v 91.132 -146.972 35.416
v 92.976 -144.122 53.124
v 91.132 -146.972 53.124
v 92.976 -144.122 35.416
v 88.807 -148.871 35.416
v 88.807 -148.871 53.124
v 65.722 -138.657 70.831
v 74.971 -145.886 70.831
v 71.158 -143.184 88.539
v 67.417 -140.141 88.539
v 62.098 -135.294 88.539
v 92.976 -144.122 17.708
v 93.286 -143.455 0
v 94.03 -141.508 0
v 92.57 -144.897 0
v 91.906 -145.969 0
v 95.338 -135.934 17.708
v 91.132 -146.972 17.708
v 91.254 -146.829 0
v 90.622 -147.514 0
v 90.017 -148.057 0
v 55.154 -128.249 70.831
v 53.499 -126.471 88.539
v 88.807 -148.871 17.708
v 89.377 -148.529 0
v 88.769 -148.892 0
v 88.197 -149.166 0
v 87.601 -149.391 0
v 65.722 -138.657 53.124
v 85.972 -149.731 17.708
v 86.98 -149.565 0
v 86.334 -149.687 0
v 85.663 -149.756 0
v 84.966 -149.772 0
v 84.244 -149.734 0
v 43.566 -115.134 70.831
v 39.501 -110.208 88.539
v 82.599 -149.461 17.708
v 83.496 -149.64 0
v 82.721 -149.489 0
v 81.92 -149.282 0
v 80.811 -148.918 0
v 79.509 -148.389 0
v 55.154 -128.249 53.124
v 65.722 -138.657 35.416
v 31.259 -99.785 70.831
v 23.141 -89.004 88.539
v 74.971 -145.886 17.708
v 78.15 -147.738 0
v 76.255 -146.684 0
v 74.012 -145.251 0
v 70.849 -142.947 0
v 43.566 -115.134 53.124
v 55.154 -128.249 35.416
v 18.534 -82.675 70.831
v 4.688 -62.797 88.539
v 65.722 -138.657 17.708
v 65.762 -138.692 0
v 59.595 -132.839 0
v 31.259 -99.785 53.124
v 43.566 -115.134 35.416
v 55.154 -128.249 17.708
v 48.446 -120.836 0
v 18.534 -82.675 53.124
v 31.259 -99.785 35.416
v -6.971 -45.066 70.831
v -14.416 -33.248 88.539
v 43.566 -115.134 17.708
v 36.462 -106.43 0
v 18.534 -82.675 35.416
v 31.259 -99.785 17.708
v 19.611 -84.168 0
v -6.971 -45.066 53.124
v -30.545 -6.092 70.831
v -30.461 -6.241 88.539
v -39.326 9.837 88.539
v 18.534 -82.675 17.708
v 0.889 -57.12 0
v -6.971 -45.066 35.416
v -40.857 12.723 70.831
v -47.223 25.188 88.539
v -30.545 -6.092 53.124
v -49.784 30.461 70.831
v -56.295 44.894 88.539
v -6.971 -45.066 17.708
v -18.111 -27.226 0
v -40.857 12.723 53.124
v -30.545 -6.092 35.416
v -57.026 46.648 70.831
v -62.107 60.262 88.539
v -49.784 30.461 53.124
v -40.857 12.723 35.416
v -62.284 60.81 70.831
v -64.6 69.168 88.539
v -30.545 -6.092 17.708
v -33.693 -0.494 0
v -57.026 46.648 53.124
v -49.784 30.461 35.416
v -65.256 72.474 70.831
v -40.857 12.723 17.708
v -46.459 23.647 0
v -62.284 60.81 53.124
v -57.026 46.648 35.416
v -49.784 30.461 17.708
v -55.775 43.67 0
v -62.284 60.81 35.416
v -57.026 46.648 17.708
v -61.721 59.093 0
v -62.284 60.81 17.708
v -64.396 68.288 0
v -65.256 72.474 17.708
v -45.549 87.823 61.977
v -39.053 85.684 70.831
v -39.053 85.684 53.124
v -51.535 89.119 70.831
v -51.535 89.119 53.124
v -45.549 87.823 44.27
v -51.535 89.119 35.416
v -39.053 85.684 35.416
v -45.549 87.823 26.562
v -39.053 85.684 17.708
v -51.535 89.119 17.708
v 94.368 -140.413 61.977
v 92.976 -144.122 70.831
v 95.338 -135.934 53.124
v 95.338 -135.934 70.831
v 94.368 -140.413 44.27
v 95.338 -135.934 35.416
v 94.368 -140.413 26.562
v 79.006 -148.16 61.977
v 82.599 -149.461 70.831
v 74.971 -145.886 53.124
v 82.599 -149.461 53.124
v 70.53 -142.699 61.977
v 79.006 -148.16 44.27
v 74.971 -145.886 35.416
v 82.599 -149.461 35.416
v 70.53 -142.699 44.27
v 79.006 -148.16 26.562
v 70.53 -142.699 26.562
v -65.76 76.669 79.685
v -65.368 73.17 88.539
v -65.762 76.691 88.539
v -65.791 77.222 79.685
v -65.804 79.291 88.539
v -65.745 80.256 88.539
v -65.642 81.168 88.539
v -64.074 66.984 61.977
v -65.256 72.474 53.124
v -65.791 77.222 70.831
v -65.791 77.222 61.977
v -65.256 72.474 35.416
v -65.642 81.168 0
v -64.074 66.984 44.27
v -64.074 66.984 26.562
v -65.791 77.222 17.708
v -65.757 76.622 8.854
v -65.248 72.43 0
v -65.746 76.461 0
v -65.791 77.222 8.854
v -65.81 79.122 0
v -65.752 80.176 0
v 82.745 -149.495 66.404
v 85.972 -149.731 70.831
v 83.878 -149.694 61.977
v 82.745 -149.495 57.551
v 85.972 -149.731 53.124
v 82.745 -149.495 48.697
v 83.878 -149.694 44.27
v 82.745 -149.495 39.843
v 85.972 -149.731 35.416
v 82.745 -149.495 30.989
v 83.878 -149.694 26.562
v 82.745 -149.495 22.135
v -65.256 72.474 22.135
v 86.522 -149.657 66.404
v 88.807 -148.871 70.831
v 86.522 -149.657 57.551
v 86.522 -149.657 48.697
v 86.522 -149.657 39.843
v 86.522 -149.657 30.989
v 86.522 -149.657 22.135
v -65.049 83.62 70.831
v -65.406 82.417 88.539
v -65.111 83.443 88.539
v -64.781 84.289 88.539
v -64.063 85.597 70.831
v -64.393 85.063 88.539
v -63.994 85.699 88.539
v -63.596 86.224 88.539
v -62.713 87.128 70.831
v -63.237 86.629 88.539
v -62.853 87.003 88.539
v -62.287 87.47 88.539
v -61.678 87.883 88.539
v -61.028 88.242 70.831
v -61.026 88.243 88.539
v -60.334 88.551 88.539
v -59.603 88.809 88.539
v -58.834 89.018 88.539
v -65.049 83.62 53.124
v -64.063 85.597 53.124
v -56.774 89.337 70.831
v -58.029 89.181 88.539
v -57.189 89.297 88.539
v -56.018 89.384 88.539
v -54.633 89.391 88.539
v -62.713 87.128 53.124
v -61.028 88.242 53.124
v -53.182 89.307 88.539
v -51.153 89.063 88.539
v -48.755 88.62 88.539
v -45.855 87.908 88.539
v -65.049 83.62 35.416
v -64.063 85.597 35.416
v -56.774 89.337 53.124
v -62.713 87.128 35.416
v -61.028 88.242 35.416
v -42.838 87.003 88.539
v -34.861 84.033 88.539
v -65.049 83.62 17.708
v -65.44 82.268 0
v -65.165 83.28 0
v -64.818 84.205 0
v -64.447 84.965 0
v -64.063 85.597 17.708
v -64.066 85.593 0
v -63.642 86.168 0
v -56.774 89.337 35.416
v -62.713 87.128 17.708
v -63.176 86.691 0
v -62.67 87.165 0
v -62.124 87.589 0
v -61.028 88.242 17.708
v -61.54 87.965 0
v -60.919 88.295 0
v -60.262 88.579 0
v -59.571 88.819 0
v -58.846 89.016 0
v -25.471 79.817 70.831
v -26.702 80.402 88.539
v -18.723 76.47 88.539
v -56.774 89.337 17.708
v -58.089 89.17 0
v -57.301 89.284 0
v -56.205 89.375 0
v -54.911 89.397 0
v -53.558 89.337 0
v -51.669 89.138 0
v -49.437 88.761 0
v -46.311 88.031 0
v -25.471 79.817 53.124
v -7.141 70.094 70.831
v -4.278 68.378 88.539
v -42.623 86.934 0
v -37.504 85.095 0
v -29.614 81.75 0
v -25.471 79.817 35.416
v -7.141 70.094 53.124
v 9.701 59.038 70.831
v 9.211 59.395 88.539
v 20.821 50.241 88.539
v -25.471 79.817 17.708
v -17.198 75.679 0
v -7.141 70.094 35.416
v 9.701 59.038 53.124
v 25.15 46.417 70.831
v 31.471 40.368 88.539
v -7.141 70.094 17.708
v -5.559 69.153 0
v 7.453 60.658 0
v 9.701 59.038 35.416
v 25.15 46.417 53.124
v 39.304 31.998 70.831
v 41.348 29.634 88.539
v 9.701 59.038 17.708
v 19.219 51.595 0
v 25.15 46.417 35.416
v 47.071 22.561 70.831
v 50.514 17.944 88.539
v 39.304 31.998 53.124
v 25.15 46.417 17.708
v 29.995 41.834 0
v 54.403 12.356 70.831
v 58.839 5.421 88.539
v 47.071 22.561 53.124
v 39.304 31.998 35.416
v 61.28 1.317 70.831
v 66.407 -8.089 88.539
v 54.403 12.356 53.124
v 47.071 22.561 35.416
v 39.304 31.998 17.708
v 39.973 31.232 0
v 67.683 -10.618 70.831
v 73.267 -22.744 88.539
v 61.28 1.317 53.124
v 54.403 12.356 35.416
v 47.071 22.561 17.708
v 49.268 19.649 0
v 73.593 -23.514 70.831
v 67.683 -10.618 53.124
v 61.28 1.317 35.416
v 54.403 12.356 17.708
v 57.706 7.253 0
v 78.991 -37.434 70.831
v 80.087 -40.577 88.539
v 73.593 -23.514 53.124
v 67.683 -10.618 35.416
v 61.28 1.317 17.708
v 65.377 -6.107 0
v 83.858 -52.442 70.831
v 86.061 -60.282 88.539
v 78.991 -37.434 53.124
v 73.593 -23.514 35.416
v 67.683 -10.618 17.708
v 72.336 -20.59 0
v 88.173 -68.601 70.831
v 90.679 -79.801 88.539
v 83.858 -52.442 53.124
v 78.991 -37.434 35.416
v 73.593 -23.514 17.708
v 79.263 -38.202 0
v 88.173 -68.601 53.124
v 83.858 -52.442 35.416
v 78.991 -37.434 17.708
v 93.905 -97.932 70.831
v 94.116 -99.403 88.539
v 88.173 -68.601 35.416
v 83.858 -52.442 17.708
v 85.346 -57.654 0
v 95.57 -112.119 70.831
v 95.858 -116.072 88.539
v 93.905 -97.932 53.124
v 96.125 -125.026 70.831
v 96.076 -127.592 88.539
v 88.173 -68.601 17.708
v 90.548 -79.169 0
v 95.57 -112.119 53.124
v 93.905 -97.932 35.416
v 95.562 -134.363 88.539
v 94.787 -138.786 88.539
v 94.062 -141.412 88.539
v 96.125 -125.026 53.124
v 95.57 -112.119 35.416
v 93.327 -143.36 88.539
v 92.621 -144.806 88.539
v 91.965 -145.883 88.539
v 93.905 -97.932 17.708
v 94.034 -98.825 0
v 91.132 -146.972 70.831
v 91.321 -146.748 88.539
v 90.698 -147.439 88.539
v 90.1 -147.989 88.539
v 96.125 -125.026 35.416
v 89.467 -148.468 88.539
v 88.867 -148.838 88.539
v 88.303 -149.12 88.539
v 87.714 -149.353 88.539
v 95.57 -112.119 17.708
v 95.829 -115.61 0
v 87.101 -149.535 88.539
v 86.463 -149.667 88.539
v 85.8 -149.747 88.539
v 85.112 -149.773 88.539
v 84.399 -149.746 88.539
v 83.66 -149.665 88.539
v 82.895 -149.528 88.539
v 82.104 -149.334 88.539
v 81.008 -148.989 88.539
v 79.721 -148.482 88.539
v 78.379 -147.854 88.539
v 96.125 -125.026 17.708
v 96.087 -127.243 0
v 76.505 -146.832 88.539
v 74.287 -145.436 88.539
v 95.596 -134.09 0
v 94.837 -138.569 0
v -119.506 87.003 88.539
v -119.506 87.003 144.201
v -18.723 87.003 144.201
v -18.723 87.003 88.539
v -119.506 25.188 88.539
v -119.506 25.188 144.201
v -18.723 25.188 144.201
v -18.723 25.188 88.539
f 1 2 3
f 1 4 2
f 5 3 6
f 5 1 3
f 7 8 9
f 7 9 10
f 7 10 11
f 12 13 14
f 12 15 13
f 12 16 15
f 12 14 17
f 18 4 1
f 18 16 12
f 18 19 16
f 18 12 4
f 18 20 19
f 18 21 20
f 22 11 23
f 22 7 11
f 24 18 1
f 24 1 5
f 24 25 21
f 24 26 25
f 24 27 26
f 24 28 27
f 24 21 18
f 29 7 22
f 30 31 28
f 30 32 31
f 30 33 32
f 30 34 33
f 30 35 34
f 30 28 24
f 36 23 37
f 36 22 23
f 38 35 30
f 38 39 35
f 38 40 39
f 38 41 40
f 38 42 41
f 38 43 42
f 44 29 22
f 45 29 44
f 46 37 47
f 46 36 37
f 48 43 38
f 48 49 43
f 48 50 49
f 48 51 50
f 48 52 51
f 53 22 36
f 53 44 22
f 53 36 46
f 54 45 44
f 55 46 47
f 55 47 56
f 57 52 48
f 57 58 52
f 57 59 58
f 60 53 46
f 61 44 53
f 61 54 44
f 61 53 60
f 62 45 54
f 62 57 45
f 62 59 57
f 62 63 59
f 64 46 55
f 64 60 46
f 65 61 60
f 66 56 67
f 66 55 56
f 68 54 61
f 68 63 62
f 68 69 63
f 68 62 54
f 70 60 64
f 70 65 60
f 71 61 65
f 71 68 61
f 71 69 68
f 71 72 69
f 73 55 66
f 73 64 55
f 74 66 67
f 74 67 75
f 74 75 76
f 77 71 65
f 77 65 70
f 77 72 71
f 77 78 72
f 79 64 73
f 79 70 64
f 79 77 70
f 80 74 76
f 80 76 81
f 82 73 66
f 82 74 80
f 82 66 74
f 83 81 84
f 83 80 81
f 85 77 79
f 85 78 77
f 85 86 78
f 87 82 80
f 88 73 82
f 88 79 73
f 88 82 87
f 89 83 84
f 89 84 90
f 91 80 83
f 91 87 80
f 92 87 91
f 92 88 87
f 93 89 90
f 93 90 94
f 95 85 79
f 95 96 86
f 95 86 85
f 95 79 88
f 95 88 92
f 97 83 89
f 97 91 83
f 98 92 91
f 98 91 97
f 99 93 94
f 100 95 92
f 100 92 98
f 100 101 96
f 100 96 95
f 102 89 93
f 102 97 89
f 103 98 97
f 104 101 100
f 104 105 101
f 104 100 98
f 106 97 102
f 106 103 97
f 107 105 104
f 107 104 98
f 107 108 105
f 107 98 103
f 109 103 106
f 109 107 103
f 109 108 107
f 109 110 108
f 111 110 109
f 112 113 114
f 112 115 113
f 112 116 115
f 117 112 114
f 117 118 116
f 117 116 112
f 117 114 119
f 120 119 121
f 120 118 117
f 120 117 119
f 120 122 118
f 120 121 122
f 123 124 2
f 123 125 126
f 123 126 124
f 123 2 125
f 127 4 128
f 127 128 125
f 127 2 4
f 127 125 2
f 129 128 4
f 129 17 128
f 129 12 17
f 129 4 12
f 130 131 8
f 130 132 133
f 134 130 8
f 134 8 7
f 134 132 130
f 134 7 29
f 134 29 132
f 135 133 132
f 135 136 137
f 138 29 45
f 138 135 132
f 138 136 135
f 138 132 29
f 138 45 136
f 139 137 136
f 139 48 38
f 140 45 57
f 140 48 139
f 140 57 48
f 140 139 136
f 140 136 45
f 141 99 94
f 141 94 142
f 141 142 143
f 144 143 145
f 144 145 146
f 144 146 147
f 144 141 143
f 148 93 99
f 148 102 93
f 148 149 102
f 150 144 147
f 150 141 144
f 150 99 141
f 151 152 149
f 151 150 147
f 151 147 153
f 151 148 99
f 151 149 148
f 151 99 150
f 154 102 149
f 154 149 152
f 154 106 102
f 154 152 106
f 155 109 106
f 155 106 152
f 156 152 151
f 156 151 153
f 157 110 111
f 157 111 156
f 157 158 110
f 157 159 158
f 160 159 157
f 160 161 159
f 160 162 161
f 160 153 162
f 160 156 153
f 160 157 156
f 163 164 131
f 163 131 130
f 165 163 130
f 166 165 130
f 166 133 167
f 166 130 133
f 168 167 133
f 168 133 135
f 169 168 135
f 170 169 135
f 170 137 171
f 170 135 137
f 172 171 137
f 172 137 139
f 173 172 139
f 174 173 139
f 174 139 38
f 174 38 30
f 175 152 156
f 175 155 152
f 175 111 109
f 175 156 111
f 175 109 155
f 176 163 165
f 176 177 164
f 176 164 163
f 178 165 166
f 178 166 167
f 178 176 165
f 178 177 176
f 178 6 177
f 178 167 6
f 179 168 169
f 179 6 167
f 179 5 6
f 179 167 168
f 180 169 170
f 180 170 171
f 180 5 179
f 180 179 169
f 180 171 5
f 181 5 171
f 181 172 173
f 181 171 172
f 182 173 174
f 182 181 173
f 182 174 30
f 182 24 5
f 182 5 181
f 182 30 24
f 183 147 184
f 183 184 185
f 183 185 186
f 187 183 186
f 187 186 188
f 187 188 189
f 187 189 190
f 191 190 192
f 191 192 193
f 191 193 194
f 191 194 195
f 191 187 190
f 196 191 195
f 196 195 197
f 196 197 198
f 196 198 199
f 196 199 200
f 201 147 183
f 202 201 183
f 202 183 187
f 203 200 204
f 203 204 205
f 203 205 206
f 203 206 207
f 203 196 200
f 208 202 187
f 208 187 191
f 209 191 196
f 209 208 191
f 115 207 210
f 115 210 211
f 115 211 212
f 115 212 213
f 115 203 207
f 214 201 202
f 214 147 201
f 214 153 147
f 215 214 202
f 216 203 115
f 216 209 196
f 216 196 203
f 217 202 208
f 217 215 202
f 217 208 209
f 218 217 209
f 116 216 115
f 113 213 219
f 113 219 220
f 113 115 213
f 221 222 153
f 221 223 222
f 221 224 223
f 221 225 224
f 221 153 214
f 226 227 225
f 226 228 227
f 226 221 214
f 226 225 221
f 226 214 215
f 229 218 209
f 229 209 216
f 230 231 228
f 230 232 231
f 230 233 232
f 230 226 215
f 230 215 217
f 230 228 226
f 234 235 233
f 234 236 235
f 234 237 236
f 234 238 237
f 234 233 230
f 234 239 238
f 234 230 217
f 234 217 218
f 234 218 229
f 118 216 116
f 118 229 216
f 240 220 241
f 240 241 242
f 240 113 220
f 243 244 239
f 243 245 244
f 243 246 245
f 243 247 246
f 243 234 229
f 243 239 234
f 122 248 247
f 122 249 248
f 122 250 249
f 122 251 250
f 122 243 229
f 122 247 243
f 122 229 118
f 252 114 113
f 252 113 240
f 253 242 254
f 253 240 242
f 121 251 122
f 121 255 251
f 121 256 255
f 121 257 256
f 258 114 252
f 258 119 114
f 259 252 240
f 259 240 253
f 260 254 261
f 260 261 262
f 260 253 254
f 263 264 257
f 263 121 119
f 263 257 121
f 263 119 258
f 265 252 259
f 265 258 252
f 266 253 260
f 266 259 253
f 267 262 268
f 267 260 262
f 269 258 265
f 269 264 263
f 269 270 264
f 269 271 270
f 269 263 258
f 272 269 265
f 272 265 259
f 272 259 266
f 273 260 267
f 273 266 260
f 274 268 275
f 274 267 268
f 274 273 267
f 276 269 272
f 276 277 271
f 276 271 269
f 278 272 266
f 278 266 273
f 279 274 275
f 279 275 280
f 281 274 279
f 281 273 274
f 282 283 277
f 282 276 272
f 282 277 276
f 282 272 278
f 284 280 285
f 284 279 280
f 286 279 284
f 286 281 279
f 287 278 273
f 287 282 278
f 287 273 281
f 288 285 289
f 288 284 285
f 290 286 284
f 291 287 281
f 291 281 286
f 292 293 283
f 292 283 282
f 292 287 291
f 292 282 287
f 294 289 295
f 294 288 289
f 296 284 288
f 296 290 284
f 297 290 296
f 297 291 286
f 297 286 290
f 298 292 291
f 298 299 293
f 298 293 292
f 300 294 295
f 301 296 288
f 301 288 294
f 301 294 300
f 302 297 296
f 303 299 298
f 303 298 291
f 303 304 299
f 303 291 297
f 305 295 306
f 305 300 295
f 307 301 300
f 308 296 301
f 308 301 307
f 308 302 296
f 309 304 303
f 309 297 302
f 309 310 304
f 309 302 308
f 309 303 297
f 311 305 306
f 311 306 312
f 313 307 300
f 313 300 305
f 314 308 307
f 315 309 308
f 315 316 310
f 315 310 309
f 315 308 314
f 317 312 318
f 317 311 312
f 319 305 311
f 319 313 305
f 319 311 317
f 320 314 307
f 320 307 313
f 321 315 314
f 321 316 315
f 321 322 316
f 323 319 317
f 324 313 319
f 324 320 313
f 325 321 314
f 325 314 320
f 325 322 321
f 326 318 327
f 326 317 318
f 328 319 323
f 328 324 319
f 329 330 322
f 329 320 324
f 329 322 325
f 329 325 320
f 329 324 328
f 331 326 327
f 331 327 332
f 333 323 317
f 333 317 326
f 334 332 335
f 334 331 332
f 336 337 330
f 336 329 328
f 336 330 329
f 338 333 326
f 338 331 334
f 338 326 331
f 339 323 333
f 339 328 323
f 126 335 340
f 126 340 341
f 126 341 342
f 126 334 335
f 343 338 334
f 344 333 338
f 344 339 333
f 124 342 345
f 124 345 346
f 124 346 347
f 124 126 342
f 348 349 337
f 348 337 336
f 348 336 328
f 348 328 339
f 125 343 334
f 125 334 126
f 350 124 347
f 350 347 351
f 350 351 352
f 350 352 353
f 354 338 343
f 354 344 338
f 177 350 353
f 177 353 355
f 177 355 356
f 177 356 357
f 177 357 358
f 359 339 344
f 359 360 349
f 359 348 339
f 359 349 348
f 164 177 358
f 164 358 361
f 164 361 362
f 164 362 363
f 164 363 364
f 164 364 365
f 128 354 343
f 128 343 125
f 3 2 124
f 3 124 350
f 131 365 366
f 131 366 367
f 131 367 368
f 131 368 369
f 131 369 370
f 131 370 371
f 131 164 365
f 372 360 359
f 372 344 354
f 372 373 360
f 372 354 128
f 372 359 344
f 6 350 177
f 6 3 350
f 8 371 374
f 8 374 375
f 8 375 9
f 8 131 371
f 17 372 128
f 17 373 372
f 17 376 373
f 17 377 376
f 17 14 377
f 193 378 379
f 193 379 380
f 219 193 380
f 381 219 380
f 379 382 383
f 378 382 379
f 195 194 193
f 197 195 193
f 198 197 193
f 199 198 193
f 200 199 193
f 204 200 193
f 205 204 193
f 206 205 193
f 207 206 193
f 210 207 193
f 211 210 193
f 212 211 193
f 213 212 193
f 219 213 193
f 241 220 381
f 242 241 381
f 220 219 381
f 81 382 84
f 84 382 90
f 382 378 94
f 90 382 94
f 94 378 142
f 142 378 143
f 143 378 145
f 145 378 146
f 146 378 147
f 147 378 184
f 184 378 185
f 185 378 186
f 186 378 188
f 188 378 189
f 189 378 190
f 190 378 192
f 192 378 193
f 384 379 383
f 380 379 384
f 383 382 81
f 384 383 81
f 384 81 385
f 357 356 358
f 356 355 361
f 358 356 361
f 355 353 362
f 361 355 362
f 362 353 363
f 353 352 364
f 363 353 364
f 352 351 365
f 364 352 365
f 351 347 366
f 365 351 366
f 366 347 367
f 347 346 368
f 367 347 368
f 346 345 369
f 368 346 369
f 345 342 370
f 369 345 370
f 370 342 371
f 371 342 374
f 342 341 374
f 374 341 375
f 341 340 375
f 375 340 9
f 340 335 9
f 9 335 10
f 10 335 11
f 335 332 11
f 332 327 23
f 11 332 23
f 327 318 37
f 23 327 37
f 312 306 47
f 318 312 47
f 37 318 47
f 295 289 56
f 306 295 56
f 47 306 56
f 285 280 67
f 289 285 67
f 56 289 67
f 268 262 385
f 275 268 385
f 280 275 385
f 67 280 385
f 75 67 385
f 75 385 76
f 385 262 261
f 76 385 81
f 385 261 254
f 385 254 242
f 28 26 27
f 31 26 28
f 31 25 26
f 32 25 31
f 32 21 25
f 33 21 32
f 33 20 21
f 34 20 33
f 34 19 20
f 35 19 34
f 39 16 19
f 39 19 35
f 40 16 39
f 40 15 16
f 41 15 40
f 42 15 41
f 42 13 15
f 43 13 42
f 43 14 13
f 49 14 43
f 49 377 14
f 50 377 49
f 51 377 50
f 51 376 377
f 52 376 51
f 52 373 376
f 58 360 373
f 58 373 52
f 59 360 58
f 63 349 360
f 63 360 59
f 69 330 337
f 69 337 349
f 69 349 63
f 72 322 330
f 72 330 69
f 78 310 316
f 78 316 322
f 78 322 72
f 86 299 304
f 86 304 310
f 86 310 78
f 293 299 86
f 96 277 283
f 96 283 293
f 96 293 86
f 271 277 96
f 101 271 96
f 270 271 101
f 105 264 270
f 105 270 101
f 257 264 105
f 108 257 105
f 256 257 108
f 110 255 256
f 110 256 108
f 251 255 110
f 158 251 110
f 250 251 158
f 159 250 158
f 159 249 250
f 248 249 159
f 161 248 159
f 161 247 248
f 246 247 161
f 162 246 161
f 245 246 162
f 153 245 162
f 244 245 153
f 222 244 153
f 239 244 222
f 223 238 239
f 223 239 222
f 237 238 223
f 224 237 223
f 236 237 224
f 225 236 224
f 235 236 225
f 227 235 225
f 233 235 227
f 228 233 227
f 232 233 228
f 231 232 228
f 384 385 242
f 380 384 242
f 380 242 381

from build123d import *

# Parameters (mm, degrees)
F1_DEPTH = 88.5392725468
F2_W     = 100.7834430784
F2_H     = 61.8151761591
F3_DEPTH = 55.661432445


with BuildPart() as f1:
    # F0 (on Top) → F1 (new body)
    with BuildSketch(Plane.XY):
        with BuildLine():
            add(Edge.make_bspline(
                [(-65.6415894628, 81.1681002378), (-63.5844308539, 95.5663277412), (-15.0057498265, 78.3136690562), (46.292998149, 34.7165173687), (91.7507515154, -50.9204878447), (110.8142053909, -241.3143935451), (-71.0143349582, 43.5637990301), (-65.6415894628, 81.1681002378)],
                knots=[0, 0, 0, 0, 0.123224994, 0.2976301952, 0.5031827797, 0.6781694281, 1, 1, 1, 1], degree=3))
        make_face()
    extrude(amount=F1_DEPTH)

    # F2 (on face) → F3 (join)
    with BuildSketch(Plane.XY.offset(88.5392725468)):
        with Locations((-69.1145779565, 56.0958664864)):
            Rectangle(F2_W, F2_H)
    extrude(amount=F3_DEPTH)


solid = f1.part
